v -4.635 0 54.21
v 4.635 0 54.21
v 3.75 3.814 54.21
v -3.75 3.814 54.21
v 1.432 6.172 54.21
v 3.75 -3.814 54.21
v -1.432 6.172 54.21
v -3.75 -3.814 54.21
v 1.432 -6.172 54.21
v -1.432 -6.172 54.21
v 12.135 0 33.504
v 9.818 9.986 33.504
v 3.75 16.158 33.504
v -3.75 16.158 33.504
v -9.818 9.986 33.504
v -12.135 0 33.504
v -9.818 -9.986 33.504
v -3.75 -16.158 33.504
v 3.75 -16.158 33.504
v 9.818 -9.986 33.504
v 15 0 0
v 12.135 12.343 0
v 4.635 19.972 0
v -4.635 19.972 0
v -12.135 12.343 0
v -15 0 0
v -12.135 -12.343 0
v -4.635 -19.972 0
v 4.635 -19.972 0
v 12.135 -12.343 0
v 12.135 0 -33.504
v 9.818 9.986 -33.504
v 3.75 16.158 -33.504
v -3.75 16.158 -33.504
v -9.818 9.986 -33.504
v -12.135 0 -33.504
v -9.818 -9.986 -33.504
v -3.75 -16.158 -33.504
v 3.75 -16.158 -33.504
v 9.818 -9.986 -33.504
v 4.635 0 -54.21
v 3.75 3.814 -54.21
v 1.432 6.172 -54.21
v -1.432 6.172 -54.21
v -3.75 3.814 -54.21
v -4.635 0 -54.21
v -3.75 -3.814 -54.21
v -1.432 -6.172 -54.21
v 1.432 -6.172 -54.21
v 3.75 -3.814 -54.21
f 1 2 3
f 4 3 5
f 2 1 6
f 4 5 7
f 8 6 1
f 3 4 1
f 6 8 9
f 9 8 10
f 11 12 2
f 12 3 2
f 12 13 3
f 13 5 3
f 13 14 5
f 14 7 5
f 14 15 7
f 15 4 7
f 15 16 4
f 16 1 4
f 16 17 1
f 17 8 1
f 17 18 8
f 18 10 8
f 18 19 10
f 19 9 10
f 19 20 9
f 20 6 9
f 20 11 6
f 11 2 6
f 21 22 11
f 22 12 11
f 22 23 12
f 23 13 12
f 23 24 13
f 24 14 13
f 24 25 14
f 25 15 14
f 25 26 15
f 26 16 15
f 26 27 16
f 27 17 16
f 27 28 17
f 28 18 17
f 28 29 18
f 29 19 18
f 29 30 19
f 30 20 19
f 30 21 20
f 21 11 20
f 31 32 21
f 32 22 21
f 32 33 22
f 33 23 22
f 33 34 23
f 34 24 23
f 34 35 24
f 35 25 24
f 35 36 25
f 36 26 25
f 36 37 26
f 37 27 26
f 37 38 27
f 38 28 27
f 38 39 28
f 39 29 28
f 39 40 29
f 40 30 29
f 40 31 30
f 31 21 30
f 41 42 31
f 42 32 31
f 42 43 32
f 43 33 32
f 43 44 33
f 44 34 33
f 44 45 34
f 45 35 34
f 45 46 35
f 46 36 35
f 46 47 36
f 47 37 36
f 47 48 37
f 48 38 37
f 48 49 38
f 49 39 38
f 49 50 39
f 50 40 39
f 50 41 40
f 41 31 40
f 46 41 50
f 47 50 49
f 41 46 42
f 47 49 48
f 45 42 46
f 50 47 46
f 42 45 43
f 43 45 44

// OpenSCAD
// Generated by SolidPython 1.0.1 on 2020-07-29 00:46:46


scale(v = [5, 7, 19]) {
	sphere(r = 3);
}
/***********************************************
*********      SolidPython code:      **********
************************************************
 
# import packages: SolidPython
from solid import *
from solid.utils import *
from itertools import chain, combinations, permutations


class Resize:

    def __init__(self, scad_file):
        self.scad_file = scad_file
        #self.scad_file = import_scad(scad_file)
        # cone/cylinder param:
        self.r1 = 0
        self.r2 = 0
        self.h = 0
        # rectangular prism param:
        self.w = 0
        self.l = 0
        # ellipse param:
        self.r = 0

    # import OpenScad code (file name corresponds to shape)


    # classify shape + parameters
    def assign(self, param1, param2, param3):
        if self.scad_file == 'cone.scad':
            self.r1 = param1
            self.r2 = param2
            self.h = param3
        elif self.scad_file == 'cylinder.scad':
            self.r1 = param1
            self.r2 = param2
            self.h = param3
        elif self.scad_file == 'rectangularPrism.scad':
            self.h = param1
            self.l = param2
            self.w = param3
        else:
            self.r = param1
            self.h = param2

    # resize parameters
    def iterate(self):
        x = range(3, 20, 2)
        i = 1
        if self.scad_file == 'cone.scad':
            tempList = list(permutations(x, 2))
            for temp in tempList:
                param1 = temp[0]
                param2 = temp[1]
                filepath = 'produced_scad_files/' + 'cone' + str(param1) + '_' + str(param2) + '_' + '.scad'
                scad_render_to_file(cylinder(h=param1, r1=param2, r2=0), filepath)

        elif self.scad_file == 'cylinder.scad':
            tempList = list(permutations(x, 3))
            for temp in tempList:
                param1 = temp[0]
                param2 = temp[1]
                filepath = 'produced_scad_files/' + 'cylinder' + str(param1) + '_' + str(param2) + '_' + '.scad'
                scad_render_to_file(cylinder(h=param1, r1=param2, r2=param2), filepath)

        elif self.scad_file == 'rectangularPrism.scad':
            tempList = list(permutations(x, 3))
            for temp in tempList:
                param1 = temp[0]
                param2 = temp[1]
                param3 = temp[2]
                filepath = 'produced_scad_files/' + 'rectangularPrism' + str(param1) + '_' + str(param2) + '_' + str(
                    param3) + '.scad'
                scad_render_to_file(cube(size=(param1, param2, param3)), filepath)

        elif self.scad_file == 'ellipse.scad':
            tempList = list(permutations(x, 4))
            for temp in tempList:
                param1 = temp[0]
                param2 = temp[1]
                param3 = temp[2]
                param4 = temp[3]
                filepath = 'produced_scad_files/' + 'ellipse' + str(param1) + '_' + str(param2) + '_' + str(param3) + '_' + str(param4) + '.scad'
                scad_render_to_file(scale([param1, param2, param3])(sphere(r=param4)), filepath)

    def render_to_scadfile(self):
        scad_render_to_file(scad, 'example.scad') 
 
************************************************/
